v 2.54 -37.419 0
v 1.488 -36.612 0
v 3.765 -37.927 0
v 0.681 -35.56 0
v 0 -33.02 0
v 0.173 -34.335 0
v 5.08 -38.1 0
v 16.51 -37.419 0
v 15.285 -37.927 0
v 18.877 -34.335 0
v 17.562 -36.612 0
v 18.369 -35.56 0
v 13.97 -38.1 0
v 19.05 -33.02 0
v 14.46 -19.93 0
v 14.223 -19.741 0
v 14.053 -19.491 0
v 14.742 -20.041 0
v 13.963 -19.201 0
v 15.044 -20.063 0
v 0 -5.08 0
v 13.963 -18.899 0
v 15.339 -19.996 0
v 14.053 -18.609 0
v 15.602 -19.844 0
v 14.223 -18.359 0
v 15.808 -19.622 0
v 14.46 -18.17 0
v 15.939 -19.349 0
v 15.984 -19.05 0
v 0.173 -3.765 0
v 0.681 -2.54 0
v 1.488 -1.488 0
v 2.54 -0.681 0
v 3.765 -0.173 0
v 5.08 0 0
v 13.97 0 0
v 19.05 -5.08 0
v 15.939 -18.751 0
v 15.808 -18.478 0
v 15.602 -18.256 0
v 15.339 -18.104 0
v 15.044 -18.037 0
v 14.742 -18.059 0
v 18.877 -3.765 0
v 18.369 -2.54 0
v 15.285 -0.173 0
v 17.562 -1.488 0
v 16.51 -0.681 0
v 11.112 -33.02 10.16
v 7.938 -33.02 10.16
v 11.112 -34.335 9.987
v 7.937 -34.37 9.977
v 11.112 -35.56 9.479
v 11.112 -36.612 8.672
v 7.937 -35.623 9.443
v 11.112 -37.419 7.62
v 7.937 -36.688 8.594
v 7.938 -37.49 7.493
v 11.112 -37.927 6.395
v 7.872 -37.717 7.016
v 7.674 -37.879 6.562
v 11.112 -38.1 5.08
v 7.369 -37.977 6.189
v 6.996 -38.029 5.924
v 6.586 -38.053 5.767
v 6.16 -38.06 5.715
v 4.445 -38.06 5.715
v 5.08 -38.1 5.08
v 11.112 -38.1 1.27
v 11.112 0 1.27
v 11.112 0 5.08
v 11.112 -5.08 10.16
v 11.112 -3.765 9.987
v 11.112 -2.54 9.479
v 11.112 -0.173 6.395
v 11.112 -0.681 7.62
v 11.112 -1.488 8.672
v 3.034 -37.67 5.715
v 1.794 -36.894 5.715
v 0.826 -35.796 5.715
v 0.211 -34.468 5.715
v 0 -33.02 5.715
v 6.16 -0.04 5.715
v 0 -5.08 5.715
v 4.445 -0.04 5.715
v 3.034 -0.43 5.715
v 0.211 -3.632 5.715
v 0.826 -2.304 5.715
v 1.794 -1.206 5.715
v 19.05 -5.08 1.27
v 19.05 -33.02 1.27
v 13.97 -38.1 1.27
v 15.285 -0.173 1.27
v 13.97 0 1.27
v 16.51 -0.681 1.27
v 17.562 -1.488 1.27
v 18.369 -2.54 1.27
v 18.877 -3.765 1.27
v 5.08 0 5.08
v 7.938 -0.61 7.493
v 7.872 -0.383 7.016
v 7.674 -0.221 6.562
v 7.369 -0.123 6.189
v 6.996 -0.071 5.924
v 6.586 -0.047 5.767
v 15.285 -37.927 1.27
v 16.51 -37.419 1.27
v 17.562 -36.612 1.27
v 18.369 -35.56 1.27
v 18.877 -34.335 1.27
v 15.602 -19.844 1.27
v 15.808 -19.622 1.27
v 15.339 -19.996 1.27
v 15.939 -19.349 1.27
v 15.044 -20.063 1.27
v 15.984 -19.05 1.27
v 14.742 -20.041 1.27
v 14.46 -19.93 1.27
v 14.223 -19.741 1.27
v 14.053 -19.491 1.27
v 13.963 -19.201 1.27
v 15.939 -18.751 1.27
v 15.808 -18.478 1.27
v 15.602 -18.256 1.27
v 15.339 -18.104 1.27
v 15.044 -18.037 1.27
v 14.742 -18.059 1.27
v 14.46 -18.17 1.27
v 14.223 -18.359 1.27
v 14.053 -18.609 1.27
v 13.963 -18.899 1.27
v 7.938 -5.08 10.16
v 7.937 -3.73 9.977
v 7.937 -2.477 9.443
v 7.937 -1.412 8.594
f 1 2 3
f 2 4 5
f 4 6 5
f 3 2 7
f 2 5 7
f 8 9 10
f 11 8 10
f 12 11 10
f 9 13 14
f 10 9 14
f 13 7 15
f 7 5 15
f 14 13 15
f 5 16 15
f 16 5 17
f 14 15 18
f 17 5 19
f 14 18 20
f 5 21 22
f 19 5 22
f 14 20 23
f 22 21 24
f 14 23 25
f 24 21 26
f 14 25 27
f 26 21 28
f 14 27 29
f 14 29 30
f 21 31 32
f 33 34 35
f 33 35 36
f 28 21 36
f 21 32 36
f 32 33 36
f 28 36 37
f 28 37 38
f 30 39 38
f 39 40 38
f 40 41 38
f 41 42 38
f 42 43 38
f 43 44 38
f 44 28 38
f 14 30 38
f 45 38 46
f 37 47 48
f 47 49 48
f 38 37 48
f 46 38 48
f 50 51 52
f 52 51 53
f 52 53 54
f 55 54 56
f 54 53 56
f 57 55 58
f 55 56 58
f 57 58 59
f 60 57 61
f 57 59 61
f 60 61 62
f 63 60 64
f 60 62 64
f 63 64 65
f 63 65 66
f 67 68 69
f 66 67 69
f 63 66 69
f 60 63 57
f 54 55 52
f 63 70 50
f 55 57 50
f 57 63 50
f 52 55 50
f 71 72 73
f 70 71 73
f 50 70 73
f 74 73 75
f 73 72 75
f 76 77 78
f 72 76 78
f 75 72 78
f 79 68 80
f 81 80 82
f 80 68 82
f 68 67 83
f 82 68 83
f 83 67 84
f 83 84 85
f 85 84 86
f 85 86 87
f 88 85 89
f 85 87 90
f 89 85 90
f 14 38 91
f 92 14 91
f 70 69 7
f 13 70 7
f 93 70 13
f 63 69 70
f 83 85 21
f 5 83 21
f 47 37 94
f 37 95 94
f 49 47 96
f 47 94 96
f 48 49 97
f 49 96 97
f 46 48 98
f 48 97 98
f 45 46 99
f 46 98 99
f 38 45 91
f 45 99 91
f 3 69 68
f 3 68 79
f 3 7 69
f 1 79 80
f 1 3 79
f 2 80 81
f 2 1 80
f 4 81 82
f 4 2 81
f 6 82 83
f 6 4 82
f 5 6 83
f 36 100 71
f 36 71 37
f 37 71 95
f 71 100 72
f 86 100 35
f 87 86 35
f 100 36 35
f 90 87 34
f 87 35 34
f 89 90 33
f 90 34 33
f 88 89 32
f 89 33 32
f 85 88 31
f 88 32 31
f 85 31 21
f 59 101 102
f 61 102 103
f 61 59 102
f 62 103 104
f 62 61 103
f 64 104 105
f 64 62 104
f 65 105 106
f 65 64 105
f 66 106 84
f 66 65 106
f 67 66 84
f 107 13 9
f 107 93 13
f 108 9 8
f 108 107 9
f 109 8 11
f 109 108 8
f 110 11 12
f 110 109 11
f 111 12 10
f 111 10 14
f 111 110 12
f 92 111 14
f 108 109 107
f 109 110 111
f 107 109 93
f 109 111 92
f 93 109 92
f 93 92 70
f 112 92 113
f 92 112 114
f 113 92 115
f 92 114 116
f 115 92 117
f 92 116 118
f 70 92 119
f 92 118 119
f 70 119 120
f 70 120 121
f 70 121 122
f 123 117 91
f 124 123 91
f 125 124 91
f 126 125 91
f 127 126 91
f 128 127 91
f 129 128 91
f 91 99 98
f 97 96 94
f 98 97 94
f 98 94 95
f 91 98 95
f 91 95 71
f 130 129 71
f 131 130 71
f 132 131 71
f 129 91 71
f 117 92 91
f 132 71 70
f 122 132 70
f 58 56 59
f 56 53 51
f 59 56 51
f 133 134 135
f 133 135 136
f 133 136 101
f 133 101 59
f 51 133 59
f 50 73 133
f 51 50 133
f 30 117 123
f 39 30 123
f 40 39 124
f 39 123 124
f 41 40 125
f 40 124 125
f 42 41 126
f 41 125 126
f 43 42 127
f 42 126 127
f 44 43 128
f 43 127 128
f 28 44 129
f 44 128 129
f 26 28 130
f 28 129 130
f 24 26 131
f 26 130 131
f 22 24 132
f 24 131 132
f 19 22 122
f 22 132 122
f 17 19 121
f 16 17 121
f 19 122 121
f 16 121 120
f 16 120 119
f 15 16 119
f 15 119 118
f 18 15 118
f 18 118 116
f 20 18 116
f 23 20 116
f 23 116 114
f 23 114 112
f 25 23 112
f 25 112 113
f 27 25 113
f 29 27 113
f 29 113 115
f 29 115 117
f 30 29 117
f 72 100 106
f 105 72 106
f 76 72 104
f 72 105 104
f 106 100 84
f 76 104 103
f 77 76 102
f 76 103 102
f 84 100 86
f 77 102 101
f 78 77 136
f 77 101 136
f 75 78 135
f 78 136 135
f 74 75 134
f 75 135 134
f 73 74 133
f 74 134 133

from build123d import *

# Parameters (mm, degrees)
F1_DEPTH    = 38.1
F2_R        = 1.778
F3_R        = 5.08
F4_R        = 1.016
F5_DEPTH    = 25.4
F6_T1_DEPTH = 28.575


# Not quite as in the source:
# - a fillet or chamfer that OpenCascade refuses, or shapes differently, is made with other operations: its cross-section is extruded or revolved along the edge and cut away or added


with BuildPart() as f1:
    # F0 (on Front) → F1 (new body)
    with BuildSketch(Plane.XZ):
        Polygon((0, 5.715), (0, 0), (19.05, 0), (19.05, 1.27), (11.1125, 1.27), (11.1125, 10.16), (7.9375, 10.16), (7.9375, 5.715), align=None)
    extrude(amount=F1_DEPTH)

    # F2
    f2_edges = [f1.edges().sort_by_distance(p)[0] for p in [
        (7.9375, -19.05, 5.715),
    ]]
    fillet(f2_edges, radius=F2_R)

    # F3
    f3_edges = [f1.edges().sort_by_distance(p)[0] for p in [
        (19.05, -38.1, 0.635),
        (0, -38.1, 2.8575),
        (0, 0, 2.8575),
        (19.05, 0, 0.635),
    ]]
    fillet(f3_edges, radius=F3_R)

    # F4 (on face) → F5 (cut)
    with BuildSketch(Plane.XY.offset(1.27)):
        with Locations((14.9681093171, -19.05)):
            Circle(F4_R)
    extrude(amount=-F5_DEPTH, mode=Mode.SUBTRACT)

    # F6: fillet of radius 5.08 on 2 edges, made by hand

    # F6_s2 → F6_t1 (cut)
    with BuildSketch(Plane.YZ.offset(-4.7625)):
        with BuildLine():
            ThreePointArc((-33.02, 10.16), (-36.6121024484, 8.6721024484), (-38.1, 5.08))
            Line((-38.1, 5.08), (-38.1, 10.16))
            Line((-38.1, 10.16), (-33.02, 10.16))
        make_face()
        with BuildLine():
            ThreePointArc((0, 5.08), (-1.4878975516, 8.6721024484), (-5.08, 10.16))
            Line((-5.08, 10.16), (0, 10.16))
            Line((0, 10.16), (0, 5.08))
        make_face()
    extrude(amount=F6_T1_DEPTH, mode=Mode.SUBTRACT)


solid = f1.part
